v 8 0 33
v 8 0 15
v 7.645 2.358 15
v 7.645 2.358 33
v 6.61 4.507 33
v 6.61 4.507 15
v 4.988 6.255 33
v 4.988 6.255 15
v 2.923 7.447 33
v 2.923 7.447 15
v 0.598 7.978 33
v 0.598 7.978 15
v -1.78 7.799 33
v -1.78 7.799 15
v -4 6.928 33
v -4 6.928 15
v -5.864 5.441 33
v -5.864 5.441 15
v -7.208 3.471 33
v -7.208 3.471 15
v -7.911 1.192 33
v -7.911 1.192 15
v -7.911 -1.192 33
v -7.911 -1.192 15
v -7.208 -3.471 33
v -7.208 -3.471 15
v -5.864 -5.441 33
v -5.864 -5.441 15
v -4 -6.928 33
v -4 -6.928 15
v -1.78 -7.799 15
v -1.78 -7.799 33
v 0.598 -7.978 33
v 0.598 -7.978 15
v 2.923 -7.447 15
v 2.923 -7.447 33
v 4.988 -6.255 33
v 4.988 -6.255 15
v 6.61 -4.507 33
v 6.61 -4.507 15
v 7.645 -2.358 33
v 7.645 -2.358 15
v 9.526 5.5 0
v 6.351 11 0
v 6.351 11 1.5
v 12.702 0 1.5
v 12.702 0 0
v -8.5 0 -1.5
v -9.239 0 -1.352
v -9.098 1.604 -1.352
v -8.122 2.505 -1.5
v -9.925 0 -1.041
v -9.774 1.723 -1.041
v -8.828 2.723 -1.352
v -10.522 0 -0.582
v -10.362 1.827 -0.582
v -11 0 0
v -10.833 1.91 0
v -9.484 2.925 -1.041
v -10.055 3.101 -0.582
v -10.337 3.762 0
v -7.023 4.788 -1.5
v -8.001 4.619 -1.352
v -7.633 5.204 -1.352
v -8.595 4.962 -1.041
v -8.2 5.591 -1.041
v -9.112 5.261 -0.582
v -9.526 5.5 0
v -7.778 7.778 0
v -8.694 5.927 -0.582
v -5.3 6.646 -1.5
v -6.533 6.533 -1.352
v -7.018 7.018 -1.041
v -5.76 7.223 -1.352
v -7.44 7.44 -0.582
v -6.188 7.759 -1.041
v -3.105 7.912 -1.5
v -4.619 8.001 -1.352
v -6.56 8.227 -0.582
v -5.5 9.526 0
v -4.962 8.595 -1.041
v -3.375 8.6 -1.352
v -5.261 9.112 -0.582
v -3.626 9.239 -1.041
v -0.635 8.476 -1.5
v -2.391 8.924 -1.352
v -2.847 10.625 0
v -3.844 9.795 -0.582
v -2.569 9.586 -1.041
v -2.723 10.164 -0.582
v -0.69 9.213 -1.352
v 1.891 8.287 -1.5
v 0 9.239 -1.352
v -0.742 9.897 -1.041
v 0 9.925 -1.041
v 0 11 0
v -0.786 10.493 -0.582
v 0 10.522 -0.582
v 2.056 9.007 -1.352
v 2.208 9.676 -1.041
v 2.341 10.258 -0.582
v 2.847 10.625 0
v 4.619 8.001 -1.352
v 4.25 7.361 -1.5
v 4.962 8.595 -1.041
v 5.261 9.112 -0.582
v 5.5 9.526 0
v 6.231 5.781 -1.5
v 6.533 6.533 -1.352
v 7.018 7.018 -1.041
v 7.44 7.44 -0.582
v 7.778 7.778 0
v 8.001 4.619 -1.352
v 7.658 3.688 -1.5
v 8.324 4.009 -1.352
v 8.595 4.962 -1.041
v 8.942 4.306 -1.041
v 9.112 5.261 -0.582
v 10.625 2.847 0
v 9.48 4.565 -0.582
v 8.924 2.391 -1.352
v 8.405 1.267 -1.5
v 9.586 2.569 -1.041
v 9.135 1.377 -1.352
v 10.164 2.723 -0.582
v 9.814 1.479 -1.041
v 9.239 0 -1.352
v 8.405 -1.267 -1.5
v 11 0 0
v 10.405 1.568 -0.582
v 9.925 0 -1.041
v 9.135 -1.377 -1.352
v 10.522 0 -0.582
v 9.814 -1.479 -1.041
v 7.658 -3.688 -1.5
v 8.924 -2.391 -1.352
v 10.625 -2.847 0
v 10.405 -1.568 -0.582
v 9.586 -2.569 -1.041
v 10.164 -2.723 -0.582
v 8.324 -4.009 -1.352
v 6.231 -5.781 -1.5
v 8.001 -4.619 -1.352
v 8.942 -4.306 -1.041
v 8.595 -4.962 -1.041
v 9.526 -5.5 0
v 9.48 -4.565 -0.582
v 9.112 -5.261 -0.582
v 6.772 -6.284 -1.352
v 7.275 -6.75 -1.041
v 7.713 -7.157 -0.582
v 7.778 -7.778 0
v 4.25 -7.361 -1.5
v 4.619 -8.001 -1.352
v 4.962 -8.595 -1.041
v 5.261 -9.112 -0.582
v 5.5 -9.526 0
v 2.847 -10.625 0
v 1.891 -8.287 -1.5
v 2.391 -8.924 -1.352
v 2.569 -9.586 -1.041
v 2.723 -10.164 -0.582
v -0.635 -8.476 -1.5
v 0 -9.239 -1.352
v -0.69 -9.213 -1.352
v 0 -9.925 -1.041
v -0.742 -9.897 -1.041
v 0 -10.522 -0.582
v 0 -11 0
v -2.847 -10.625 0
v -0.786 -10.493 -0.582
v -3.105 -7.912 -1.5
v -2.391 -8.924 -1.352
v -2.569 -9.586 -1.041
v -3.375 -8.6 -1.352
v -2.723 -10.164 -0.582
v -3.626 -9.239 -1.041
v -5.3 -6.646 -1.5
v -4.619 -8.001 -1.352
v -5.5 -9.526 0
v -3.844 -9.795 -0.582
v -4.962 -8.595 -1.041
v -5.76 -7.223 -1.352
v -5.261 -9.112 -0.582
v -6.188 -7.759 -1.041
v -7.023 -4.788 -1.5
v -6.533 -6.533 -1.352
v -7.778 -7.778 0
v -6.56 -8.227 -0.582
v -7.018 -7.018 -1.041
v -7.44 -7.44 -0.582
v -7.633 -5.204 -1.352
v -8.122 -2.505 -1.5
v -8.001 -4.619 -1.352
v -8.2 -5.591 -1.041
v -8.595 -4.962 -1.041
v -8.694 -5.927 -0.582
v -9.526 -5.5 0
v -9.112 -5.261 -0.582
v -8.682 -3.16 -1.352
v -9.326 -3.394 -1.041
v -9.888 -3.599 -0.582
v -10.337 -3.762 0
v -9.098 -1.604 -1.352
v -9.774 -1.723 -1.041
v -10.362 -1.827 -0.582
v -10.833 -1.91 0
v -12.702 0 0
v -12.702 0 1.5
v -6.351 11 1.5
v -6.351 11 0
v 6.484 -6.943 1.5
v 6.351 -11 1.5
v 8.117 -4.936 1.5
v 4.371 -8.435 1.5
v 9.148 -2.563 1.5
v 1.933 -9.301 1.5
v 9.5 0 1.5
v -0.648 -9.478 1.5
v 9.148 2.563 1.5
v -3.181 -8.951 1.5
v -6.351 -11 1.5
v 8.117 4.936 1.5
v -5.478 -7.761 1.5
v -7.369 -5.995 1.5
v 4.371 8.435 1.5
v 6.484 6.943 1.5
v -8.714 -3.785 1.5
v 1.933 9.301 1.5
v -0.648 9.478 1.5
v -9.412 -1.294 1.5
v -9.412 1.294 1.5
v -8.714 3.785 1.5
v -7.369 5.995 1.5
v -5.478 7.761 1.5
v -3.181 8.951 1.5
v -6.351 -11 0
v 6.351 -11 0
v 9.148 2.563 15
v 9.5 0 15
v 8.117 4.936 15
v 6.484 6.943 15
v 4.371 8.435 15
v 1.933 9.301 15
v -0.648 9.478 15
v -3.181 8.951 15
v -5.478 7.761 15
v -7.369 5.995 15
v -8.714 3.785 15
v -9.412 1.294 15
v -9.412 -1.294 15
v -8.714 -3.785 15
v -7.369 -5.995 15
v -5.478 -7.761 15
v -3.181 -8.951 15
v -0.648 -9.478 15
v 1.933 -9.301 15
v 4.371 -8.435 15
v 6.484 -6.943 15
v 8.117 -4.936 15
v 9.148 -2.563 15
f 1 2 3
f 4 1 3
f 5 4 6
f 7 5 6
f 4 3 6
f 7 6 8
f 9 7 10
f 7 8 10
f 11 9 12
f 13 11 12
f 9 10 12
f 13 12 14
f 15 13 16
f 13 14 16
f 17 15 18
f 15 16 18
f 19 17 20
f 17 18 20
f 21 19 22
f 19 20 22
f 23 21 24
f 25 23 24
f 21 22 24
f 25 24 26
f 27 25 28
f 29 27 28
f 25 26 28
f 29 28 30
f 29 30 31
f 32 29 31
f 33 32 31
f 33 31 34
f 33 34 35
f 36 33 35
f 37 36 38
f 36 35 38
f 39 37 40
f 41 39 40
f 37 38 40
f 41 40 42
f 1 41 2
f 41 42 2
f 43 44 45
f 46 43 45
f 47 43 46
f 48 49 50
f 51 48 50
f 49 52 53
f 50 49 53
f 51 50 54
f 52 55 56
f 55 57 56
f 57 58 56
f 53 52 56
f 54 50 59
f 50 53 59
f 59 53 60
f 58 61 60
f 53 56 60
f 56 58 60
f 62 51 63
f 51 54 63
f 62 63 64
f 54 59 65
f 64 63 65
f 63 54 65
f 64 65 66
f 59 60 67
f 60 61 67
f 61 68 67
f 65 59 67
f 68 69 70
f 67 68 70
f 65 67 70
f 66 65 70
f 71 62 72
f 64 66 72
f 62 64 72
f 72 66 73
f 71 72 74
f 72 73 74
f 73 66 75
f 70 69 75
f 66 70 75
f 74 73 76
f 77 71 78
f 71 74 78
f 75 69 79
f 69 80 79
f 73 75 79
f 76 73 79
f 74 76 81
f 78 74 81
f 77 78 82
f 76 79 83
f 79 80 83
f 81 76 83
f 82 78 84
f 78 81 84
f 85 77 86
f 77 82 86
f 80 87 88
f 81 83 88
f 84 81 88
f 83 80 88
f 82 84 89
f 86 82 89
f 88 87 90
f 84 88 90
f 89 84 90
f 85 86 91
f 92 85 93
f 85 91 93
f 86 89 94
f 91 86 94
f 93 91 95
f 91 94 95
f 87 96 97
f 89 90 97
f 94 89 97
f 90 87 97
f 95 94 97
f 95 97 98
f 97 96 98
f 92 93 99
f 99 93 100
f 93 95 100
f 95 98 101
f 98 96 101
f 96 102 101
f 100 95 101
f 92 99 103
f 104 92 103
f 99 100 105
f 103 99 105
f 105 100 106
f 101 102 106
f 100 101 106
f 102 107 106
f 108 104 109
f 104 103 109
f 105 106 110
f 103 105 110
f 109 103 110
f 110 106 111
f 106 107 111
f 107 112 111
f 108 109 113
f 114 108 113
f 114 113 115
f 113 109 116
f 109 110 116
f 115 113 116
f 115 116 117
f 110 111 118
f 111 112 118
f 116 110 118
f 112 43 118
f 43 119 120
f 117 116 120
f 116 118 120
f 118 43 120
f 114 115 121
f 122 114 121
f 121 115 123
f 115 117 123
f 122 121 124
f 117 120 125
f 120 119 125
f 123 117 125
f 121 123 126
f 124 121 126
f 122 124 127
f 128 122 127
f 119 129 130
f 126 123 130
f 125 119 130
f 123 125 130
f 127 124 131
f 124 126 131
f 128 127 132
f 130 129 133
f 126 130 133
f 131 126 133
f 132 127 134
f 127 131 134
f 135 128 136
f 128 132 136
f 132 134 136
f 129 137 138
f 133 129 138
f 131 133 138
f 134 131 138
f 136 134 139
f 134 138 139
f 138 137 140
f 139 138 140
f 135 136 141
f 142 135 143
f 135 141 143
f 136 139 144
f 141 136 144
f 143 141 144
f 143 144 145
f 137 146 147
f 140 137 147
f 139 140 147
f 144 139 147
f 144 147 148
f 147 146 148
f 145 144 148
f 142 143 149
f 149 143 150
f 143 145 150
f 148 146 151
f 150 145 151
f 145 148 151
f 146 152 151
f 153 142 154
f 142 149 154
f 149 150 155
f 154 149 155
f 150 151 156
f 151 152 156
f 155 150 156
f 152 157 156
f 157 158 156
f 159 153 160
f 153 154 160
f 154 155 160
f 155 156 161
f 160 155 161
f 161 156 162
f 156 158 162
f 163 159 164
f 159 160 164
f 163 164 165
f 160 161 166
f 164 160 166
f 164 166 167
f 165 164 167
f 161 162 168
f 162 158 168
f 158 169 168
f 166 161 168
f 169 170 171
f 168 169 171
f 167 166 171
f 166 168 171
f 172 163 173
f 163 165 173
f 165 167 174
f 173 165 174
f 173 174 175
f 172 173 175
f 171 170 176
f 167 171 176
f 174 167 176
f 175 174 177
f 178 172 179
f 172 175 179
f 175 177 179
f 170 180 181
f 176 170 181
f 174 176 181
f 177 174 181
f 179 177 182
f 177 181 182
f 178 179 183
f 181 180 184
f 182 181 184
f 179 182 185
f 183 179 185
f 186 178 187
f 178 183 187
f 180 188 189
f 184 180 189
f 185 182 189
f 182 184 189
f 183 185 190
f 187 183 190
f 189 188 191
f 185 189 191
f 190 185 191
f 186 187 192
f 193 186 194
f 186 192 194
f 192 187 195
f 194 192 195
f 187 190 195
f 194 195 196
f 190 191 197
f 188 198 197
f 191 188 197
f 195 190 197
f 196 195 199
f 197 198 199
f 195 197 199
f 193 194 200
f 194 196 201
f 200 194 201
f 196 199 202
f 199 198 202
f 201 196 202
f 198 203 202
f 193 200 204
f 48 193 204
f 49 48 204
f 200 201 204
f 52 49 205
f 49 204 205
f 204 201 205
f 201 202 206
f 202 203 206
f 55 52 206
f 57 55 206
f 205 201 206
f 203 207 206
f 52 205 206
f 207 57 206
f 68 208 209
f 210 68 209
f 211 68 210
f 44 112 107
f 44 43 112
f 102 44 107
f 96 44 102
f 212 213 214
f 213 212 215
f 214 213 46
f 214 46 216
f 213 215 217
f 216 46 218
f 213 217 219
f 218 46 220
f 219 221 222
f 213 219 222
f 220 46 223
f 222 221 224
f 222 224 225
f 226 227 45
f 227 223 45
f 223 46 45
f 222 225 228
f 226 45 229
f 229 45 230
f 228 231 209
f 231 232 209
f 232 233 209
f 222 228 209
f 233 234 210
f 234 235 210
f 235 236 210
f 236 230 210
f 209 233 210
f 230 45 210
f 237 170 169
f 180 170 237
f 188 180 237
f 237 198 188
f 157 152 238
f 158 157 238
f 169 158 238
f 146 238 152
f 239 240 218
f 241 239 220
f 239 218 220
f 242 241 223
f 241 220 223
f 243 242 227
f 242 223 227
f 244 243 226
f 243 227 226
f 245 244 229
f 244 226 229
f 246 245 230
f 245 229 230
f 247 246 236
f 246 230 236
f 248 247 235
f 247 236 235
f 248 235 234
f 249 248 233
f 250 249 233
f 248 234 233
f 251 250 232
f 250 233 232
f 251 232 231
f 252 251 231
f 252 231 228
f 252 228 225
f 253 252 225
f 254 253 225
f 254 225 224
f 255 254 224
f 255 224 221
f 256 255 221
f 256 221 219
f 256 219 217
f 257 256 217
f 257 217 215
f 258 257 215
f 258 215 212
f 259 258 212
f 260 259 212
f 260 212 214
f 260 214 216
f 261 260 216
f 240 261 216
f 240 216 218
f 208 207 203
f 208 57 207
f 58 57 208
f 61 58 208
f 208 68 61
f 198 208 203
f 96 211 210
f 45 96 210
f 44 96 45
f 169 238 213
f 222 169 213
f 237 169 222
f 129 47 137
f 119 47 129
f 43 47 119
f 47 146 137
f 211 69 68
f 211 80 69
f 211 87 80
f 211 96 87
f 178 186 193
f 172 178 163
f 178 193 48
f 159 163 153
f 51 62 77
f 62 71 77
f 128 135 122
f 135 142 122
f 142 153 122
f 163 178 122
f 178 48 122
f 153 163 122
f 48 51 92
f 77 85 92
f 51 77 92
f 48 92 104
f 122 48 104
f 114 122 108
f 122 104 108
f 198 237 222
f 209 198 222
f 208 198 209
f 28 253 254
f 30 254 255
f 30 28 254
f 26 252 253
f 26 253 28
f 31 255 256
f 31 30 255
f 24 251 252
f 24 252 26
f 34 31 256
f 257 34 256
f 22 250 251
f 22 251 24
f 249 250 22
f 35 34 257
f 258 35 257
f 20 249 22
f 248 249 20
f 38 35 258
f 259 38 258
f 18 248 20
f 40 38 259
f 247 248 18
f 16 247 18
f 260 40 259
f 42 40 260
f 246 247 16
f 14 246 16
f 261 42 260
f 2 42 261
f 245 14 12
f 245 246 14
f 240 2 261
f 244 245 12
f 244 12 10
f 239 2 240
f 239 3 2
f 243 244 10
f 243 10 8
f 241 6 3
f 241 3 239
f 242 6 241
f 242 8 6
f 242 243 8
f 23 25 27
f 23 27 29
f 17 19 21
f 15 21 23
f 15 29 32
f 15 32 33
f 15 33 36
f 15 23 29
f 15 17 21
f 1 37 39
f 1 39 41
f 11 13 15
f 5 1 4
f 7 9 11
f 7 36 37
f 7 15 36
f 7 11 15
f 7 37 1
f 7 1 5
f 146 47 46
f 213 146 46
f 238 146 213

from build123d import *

# Parameters (mm, degrees)
SKETCH_1_R      = 9.5
EXTRUDE_1_DEPTH = 15
EXTRUDE_2_DEPTH = 1.5
SKETCH_4_R      = 8
EXTRUDE_3_DEPTH = 18


with BuildPart() as part:
    # 草图1 → 凸台-拉伸1 (new body)
    with BuildSketch(Plane.XY):
        Circle(SKETCH_1_R)
    extrude(amount=EXTRUDE_1_DEPTH)

    # 草图2 → 凸台-拉伸2 (add)
    with BuildSketch(Plane(origin=(0, 0, 0), x_dir=(-1, 0, 0), z_dir=(0, 0, -1))):
        Polygon((6.350852961, 11), (-6.350852961, 11), (-12.701705922, 0), (-6.350852961, -11), (6.350852961, -11), (12.701705922, 0), align=None)
    extrude(amount=-EXTRUDE_2_DEPTH)

    # 草图3 → 旋转1 (revolve)
    with BuildSketch(Plane(origin=(0, 0, 0), x_dir=(1, 0, 0), z_dir=(0, 1, 0))):
        with BuildLine():
            Line((0, 0), (0, 1.5))
            Line((0, 1.5), (-8.5, 1.5))
            ThreePointArc((-8.5, 1.5), (-9.924633098, 1.041055163), (-11, 0))
            Line((-11, 0), (0, 0))
        make_face()
    revolve(axis=Axis((0, 0, 0), (0, 0, -1)))

    # 草图4 → 凸台-拉伸3 (add)
    with BuildSketch(Plane.XY.offset(15)):
        Circle(SKETCH_4_R)
    extrude(amount=EXTRUDE_3_DEPTH)


solid = part.part
